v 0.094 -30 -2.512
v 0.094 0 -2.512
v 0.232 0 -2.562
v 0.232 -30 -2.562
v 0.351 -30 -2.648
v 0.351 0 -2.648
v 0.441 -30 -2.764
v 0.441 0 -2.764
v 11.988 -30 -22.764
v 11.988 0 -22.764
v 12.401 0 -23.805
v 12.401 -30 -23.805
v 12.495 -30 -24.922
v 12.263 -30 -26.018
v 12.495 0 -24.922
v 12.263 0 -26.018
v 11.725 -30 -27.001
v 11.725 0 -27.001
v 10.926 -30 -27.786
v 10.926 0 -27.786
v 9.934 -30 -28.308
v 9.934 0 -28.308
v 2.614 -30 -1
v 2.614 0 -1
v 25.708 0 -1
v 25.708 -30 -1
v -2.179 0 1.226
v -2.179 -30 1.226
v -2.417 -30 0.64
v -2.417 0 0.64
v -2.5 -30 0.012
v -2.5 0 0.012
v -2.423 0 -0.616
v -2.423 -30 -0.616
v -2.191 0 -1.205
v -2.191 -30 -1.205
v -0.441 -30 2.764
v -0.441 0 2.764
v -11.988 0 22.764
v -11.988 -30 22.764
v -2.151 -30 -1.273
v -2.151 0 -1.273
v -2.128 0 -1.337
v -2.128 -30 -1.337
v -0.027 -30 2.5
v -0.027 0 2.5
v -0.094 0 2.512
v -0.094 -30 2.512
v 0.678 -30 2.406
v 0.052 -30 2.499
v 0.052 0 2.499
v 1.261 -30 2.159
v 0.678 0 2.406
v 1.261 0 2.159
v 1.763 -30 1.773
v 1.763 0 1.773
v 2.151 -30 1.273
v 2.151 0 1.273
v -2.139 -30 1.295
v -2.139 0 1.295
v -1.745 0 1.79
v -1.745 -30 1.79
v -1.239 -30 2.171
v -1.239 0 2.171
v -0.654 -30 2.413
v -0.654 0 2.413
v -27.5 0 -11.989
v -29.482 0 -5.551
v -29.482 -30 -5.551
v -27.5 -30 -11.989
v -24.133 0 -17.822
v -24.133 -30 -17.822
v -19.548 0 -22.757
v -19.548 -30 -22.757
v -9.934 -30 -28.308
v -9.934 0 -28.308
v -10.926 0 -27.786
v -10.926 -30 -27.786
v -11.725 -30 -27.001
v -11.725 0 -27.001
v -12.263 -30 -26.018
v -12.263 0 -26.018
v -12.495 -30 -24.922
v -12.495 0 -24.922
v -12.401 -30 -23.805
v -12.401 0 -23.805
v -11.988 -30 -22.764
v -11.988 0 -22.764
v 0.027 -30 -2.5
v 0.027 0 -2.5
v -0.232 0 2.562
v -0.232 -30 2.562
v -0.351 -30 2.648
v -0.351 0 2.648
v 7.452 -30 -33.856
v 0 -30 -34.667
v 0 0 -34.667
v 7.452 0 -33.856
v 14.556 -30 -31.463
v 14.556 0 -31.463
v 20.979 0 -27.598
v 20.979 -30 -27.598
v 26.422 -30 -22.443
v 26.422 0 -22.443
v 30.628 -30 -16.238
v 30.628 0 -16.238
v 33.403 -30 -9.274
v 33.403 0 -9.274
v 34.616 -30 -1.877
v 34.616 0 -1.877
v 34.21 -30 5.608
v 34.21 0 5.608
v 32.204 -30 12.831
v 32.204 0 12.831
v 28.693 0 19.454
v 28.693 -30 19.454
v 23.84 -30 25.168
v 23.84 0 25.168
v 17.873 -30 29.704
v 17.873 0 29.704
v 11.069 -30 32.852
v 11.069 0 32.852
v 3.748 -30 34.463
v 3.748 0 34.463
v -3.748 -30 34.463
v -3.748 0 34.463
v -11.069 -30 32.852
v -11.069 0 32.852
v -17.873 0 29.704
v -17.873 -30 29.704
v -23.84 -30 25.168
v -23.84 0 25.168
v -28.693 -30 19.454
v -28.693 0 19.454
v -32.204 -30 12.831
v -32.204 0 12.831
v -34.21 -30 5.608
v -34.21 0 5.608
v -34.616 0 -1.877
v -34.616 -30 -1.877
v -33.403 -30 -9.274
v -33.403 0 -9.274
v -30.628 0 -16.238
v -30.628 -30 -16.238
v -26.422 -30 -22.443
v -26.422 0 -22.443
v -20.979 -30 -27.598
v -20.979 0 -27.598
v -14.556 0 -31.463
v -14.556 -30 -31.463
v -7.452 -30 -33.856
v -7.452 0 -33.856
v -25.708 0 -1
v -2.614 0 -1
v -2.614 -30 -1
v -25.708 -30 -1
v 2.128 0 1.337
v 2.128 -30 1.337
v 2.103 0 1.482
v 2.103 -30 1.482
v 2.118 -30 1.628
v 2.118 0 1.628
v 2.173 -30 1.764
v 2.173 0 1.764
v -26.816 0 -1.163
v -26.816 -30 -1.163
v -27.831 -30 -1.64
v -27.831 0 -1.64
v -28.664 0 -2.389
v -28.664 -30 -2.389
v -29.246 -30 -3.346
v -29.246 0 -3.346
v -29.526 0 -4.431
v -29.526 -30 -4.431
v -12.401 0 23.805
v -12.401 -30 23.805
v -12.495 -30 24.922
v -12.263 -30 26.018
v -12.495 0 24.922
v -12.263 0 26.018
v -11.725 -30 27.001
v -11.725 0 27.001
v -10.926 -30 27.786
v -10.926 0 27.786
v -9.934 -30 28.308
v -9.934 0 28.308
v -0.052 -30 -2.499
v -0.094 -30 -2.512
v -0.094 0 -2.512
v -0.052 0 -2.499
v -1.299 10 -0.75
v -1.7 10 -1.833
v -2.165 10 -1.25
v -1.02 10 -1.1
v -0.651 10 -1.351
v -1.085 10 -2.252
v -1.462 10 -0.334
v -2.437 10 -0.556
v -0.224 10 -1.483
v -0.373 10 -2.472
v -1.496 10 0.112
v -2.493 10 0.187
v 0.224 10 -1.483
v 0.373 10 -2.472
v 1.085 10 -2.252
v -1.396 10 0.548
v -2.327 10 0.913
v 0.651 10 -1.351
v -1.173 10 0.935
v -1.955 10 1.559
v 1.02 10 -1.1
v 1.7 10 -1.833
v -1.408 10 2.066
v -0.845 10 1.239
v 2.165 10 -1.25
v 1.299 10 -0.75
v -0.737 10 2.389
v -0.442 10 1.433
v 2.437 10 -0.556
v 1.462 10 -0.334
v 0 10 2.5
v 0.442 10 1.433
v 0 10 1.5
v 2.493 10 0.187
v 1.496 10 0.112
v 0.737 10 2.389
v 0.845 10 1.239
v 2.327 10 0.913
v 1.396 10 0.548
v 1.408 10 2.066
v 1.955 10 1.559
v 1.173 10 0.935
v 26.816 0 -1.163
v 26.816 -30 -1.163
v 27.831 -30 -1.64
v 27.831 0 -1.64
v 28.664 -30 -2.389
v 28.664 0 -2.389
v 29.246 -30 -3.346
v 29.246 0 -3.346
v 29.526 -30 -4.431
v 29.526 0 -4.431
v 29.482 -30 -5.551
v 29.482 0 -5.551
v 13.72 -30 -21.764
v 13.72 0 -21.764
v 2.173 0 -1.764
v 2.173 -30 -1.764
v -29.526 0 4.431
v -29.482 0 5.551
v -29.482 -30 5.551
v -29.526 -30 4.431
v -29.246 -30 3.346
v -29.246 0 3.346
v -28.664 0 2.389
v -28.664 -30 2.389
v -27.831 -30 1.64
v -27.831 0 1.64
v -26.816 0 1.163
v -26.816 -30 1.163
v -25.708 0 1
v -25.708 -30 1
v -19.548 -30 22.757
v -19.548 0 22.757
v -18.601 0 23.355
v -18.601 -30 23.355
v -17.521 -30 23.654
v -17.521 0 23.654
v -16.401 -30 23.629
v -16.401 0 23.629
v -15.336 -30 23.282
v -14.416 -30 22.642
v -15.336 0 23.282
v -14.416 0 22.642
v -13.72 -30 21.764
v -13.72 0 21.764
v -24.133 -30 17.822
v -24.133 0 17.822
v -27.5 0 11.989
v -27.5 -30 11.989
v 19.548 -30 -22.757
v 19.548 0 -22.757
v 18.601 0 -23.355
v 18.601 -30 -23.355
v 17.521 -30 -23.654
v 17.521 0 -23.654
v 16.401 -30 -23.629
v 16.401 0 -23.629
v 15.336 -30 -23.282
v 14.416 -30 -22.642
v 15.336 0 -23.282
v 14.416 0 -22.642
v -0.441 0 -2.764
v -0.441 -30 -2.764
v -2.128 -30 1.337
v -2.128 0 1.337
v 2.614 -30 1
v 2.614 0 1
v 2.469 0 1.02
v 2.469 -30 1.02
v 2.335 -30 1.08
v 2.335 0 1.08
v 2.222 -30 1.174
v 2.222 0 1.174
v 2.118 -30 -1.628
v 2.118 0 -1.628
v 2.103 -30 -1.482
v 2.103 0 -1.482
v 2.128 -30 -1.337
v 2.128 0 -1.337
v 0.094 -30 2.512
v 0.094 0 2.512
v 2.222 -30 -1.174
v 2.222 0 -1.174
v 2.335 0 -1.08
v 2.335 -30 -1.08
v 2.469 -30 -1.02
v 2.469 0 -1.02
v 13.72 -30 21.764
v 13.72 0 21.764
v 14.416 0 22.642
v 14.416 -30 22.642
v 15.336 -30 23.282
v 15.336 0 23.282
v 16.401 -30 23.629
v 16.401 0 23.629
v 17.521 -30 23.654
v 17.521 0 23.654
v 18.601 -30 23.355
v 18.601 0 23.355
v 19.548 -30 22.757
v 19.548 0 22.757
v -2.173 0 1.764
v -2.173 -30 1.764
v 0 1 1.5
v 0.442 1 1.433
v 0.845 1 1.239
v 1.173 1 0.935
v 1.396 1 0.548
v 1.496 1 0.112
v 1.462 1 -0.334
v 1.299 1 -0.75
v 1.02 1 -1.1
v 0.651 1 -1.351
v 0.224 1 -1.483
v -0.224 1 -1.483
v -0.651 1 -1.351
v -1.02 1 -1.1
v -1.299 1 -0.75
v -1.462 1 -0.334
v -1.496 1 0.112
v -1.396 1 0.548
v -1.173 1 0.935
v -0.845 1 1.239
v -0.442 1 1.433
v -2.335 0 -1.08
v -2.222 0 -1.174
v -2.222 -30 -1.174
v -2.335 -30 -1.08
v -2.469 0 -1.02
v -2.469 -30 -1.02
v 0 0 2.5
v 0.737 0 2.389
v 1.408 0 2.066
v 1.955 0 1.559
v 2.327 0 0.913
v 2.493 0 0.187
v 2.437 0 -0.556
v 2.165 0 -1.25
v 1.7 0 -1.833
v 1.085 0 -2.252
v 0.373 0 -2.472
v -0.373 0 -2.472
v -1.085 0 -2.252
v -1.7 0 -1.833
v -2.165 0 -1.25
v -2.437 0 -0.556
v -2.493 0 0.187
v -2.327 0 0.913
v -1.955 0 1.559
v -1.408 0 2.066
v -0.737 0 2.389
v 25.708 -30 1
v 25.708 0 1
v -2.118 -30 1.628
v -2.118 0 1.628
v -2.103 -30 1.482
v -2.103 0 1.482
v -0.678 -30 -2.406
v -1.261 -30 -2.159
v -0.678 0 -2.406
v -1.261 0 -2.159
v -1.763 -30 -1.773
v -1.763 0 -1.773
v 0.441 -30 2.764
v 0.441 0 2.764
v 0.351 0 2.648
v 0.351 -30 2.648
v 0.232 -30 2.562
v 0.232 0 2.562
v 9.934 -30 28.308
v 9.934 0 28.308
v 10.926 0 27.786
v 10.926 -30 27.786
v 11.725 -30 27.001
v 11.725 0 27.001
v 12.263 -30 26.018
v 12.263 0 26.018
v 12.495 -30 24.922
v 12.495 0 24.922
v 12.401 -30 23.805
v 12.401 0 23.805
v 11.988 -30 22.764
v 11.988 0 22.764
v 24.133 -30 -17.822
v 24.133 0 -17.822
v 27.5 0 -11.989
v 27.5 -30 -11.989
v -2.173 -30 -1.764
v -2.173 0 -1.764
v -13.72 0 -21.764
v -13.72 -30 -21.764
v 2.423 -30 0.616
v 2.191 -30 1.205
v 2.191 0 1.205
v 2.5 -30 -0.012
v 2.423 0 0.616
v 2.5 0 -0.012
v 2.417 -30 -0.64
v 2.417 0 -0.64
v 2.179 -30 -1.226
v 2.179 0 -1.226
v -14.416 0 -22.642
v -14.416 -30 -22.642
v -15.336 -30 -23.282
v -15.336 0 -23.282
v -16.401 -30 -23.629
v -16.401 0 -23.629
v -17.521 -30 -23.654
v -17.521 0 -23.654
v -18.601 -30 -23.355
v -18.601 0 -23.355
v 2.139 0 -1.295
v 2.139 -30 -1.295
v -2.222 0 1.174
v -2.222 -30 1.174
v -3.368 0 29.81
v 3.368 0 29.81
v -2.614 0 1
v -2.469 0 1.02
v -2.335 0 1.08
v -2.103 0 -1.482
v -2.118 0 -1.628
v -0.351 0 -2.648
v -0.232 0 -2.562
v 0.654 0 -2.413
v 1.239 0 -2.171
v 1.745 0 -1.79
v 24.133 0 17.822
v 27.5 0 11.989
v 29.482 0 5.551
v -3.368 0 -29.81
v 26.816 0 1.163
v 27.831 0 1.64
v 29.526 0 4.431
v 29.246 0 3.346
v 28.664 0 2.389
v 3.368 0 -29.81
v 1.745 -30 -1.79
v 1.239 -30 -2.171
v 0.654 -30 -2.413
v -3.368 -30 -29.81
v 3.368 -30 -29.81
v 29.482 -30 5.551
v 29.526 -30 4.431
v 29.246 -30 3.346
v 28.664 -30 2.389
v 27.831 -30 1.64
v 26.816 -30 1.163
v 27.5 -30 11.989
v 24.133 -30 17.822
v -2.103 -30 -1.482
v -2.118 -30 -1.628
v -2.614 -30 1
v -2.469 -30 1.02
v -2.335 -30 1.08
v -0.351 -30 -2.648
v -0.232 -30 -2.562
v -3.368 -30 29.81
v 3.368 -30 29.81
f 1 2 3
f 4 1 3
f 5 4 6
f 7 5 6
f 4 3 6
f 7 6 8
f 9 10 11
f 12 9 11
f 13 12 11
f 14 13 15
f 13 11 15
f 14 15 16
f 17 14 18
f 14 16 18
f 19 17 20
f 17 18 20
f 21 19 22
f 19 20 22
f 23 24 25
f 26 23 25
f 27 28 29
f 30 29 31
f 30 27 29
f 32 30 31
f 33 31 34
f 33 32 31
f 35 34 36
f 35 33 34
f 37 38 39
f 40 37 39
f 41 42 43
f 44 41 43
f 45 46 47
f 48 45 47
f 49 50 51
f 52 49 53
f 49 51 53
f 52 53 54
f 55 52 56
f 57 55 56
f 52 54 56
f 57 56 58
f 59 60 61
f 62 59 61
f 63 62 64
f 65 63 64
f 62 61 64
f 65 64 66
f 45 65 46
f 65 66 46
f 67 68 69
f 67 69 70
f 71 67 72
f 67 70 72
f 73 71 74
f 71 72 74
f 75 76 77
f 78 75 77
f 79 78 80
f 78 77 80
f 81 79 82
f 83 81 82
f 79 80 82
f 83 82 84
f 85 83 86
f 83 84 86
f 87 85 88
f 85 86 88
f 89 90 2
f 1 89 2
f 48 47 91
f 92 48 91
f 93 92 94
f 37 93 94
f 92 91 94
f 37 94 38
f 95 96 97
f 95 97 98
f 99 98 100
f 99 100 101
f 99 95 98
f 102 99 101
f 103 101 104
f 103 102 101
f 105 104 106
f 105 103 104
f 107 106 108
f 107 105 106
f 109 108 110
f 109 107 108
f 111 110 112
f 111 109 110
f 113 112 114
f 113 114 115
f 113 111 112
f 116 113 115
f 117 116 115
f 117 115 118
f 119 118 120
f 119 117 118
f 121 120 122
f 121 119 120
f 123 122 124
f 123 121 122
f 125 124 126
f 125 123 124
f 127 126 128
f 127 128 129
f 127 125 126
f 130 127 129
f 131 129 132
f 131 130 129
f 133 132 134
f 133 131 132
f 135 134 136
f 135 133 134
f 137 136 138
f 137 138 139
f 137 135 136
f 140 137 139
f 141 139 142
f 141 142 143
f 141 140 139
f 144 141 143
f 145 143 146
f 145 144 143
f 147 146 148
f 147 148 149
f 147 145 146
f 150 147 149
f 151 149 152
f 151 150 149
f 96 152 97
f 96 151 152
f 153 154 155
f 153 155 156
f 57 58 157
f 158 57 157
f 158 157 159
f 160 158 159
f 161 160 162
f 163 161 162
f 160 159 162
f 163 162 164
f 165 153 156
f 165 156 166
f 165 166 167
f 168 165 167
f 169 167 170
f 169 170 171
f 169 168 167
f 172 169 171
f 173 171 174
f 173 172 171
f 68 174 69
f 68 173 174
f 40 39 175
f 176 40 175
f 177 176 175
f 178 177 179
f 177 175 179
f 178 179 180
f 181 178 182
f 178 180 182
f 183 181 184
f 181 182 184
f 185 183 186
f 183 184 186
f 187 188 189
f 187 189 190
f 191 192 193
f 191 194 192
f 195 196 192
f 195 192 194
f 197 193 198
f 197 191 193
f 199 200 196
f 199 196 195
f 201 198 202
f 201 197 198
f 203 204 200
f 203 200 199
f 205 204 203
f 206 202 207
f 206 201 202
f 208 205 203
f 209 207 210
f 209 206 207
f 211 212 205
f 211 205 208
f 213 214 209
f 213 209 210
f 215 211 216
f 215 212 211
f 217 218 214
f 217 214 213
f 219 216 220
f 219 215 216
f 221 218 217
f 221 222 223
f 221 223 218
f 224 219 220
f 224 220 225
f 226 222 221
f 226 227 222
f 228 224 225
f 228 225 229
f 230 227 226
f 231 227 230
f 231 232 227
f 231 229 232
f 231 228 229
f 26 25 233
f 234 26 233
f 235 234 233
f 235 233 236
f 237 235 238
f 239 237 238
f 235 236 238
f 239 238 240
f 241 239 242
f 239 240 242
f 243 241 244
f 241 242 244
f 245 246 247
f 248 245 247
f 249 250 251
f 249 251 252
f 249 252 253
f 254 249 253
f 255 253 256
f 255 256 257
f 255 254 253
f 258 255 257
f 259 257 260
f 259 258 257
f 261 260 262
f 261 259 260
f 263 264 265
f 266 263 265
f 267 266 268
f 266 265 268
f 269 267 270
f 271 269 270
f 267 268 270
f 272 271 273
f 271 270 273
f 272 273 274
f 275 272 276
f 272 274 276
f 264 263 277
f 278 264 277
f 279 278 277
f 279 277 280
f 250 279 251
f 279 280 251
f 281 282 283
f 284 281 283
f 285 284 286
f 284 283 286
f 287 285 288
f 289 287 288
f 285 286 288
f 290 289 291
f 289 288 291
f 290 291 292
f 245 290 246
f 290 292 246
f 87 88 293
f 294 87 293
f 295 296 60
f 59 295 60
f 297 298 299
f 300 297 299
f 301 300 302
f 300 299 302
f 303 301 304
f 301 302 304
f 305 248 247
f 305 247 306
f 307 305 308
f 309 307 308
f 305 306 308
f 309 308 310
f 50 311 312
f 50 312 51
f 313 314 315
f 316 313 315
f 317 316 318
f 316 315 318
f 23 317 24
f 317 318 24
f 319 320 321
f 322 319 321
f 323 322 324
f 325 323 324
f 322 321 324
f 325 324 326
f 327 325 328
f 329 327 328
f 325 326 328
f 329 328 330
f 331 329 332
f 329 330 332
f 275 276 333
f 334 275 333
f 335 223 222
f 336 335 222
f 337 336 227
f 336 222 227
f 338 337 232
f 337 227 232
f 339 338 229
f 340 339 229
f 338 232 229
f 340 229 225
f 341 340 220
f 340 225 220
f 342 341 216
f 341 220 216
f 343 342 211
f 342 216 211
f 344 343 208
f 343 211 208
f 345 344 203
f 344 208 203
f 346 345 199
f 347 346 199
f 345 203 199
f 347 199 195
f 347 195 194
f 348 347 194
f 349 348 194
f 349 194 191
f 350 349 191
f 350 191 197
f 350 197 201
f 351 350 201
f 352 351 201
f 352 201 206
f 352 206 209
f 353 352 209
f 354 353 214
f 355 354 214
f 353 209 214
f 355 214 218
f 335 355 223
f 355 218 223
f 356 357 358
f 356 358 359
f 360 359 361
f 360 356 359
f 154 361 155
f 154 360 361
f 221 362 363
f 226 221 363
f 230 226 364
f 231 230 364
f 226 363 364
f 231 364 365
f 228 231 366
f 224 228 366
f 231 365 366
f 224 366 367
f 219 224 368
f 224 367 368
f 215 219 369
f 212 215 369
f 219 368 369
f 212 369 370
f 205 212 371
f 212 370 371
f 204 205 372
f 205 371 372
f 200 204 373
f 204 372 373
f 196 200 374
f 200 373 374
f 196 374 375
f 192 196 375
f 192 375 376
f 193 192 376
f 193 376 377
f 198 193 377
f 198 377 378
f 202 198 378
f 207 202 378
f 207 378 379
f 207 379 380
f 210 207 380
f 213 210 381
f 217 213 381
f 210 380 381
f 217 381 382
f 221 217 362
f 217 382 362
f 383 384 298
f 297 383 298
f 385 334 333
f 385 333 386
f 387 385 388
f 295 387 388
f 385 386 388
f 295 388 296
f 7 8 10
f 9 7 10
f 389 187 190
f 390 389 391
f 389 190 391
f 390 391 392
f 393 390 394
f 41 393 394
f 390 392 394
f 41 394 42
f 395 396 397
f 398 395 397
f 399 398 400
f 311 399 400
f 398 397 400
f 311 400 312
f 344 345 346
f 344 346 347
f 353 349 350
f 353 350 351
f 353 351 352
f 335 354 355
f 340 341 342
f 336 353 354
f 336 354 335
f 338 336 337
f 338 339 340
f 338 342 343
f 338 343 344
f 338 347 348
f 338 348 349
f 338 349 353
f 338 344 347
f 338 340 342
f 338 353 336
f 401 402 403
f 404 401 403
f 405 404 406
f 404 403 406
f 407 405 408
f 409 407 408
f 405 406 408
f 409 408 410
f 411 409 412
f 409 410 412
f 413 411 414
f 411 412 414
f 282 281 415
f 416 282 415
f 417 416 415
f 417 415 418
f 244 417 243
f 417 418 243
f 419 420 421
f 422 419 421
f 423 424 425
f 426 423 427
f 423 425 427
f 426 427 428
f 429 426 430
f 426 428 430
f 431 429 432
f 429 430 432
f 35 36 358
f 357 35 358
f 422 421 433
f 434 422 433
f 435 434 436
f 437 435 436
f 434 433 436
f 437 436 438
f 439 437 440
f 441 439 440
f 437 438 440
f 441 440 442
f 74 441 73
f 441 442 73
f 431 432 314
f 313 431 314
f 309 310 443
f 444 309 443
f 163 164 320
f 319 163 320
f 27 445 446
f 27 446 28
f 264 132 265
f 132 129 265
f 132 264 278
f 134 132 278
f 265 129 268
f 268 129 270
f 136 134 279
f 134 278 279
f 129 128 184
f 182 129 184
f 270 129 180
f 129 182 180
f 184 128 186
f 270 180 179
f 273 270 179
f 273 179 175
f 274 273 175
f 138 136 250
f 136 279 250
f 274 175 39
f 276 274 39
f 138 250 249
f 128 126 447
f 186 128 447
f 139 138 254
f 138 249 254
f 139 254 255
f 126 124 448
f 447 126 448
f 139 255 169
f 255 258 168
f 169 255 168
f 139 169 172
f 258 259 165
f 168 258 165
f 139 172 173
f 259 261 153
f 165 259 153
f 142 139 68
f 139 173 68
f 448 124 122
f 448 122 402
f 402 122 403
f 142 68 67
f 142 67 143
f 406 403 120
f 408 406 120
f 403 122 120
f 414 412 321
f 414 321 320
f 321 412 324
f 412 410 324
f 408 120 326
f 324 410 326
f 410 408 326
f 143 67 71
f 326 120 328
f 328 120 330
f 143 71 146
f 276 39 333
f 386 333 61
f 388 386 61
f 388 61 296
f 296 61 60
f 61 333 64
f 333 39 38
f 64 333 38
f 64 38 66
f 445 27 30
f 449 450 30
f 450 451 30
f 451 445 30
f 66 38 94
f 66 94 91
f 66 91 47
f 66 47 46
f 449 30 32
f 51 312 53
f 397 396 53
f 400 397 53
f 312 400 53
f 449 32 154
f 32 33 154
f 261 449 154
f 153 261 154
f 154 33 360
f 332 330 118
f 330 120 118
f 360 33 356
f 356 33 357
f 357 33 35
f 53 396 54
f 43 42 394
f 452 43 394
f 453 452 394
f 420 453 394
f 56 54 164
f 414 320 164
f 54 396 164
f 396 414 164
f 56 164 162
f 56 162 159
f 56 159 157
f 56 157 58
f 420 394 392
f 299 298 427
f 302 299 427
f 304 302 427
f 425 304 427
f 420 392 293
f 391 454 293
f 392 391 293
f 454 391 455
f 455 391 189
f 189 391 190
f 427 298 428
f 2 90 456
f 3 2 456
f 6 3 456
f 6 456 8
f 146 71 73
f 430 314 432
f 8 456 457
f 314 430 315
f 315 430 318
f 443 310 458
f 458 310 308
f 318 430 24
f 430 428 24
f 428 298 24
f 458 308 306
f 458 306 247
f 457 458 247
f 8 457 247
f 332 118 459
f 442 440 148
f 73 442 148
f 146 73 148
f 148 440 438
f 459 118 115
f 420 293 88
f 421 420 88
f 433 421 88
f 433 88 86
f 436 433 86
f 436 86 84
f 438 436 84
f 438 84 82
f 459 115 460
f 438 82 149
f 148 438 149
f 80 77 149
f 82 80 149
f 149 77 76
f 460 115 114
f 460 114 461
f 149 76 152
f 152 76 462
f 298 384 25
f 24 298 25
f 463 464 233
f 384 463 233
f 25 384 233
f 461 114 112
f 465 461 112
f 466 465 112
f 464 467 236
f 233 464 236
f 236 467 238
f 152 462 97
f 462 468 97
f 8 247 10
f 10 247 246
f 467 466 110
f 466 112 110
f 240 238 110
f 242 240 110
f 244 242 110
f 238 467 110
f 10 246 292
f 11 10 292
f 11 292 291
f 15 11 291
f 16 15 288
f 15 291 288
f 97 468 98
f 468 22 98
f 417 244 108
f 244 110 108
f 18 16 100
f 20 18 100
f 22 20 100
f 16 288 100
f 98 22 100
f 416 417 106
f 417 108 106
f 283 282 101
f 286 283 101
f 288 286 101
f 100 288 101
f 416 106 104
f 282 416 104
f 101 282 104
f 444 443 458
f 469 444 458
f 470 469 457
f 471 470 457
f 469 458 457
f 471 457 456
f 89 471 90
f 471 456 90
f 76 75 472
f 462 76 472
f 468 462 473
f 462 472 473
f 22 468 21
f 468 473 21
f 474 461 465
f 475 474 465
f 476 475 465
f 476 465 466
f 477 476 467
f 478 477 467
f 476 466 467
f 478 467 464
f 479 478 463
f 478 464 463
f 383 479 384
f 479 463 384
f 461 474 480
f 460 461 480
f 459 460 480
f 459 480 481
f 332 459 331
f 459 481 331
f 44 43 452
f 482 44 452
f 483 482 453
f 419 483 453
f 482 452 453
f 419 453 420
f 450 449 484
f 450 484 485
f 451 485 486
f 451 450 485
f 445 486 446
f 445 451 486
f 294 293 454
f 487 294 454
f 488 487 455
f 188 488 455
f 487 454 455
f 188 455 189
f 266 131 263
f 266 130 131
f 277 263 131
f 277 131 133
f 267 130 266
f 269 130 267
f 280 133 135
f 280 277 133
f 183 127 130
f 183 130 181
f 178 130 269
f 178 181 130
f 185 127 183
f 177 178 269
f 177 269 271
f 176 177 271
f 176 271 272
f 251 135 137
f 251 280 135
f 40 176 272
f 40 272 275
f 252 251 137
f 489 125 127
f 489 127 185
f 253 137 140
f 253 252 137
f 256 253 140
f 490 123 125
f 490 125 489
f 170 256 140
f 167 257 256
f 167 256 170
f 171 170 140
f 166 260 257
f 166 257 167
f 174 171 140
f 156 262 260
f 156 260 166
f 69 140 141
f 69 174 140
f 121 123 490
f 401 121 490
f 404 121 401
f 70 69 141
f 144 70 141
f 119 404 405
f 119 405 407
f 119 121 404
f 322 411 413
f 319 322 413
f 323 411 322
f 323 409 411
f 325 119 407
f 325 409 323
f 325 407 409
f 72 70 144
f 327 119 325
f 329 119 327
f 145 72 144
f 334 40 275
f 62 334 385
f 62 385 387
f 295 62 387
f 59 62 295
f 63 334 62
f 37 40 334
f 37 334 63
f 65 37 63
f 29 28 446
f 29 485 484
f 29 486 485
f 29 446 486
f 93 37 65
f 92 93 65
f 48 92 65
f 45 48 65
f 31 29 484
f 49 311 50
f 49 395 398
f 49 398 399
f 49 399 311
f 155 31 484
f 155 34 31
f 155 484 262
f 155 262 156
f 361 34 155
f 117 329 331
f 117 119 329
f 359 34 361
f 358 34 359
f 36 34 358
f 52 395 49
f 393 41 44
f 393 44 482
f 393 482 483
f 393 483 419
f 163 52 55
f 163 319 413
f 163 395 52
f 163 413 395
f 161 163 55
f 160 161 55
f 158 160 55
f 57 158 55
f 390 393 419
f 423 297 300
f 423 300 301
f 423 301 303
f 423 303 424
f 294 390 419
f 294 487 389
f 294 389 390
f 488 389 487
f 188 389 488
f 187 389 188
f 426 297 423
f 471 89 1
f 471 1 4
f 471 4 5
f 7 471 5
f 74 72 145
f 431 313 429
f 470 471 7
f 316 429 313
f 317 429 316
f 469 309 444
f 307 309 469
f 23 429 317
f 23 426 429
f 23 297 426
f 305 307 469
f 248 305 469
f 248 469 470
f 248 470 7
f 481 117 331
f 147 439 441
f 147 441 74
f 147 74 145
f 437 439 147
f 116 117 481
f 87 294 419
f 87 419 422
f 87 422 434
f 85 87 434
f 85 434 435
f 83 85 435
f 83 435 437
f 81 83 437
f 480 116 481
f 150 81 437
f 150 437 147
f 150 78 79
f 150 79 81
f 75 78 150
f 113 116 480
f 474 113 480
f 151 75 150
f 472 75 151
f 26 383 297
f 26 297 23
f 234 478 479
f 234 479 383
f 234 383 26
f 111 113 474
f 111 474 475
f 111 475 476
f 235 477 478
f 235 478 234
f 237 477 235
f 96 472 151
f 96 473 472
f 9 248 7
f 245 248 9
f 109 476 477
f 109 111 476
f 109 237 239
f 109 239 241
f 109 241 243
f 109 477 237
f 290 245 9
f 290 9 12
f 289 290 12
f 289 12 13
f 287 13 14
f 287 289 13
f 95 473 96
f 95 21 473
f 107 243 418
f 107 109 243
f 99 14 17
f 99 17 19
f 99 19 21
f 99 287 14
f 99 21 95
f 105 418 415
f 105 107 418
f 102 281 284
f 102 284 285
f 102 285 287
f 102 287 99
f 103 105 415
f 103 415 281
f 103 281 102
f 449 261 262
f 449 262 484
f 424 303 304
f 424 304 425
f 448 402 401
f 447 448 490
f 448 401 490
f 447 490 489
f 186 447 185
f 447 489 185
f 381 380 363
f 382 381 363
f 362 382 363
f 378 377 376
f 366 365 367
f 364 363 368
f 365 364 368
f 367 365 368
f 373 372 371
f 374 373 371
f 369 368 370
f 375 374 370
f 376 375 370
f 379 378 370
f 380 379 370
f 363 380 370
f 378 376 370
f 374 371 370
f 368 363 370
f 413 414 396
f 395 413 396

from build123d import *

# Parameters (mm, degrees)
SKETCH1_R             = 2.5
SKETCH1_R_2           = 1.5
BOSS_EXTRUDE1_DEPTH   = 10
BOSS_EXTRUDE3_DEPTH   = 30
BOSS_EXTRUDE3_2_DEPTH = 30
BOSS_EXTRUDE3_3_DEPTH = 30
BOSS_EXTRUDE3_4_DEPTH = 30
BOSS_EXTRUDE3_5_DEPTH = 30
BOSS_EXTRUDE3_6_DEPTH = 30
SKETCH5_R             = 34.666608733
SKETCH5_R_2           = 30
BOSS_EXTRUDE4_DEPTH   = 30
BOSS_EXTRUDE5_START   = -10
SKETCH6_R             = 1.5
BOSS_EXTRUDE5_DEPTH   = 10
SKETCH7_R             = 1.5
CUT_EXTRUDE1_DEPTH    = 9


with BuildPart() as part:
    # Sketch1 → Boss-Extrude1 (new body)
    with BuildSketch(Plane(origin=(0, 0, 0), x_dir=(1, 0, 0), z_dir=(0, 1, 0))):
        with Locations(Location((0, 0, 0), (0, 0, 270))):
            Circle(SKETCH1_R)
        with Locations(Location((0, 0, 0), (0, 0, 270))):
            Circle(SKETCH1_R_2, mode=Mode.SUBTRACT)
    extrude(amount=BOSS_EXTRUDE1_DEPTH)

    # Sketch6 → Boss-Extrude5 (add)
    with BuildSketch(Plane(origin=(0, 10, 0), x_dir=(1, 0, 0), z_dir=(0, 1, 0)).offset(BOSS_EXTRUDE5_START)):
        Circle(SKETCH6_R)
    extrude(amount=BOSS_EXTRUDE5_DEPTH)

    # Sketch7 → Cut-Extrude1 (cut)
    with BuildSketch(Plane(origin=(0, 10, 0), x_dir=(1, 0, 0), z_dir=(0, 1, 0))):
        with Locations(Location((0, 0, 0), (0, 0, 270))):
            Circle(SKETCH7_R)
    extrude(amount=-CUT_EXTRUDE1_DEPTH, mode=Mode.SUBTRACT)


with BuildPart() as body_2:
    # Sketch2 → Boss-Extrude3 (new body)
    with BuildSketch(Plane(origin=(0, 0, 0), x_dir=(-1, 0, 0), z_dir=(0, -1, 0))):
        with BuildLine():
            Line((2.61395079, 1), (25.707973339, 1))
            ThreePointArc((25.707973339, 1), (28.664062792, 2.388870469), (29.481986287, 5.550899437))
            ThreePointArc((29.481986287, 5.550899437), (30, 0), (29.481986287, -5.550899437))
            ThreePointArc((29.481986287, -5.550899437), (28.664062792, -2.388870469), (25.707973339, -1))
            Line((25.707973339, -1), (2.61395079, -1))
            ThreePointArc((2.61395079, -1), (2.399550586, -1.045528996), (2.222154945, -1.174257873))
            Line((2.222154945, -1.174257873), (2.178514499, -1.226407182))
            ThreePointArc((2.178514499, -1.226407182), (2.499969191, -0.012411485), (2.190584188, 1.204716114))
            Line((2.190584188, 1.204716114), (2.222154945, 1.174257873))
            ThreePointArc((2.222154945, 1.174257873), (2.399550586, 1.045528996), (2.61395079, 1))
        make_face()
    extrude(amount=BOSS_EXTRUDE3_DEPTH)



with BuildPart() as body_3:
    # Sketch2 → Boss-Extrude3 2 (new body)
    with BuildSketch(Plane(origin=(0, 0, 0), x_dir=(-1, 0, 0), z_dir=(0, -1, 0))):
        with BuildLine():
            Line((0.440949991, -2.763747789), (11.987961266, -22.763757991))
            ThreePointArc((11.987961266, -22.763757991), (12.263208883, -26.018241788), (9.933773217, -28.307598797))
            ThreePointArc((9.933773217, -28.307598797), (15, -25.980762114), (19.54821307, -22.75669936))
            ThreePointArc((19.54821307, -22.75669936), (16.400853909, -23.629371319), (13.720012073, -21.763757991))
            Line((13.720012073, -21.763757991), (2.173000799, -1.763747789))
            ThreePointArc((2.173000799, -1.763747789), (2.105229964, -1.555307267), (2.128014621, -1.337313697))
            Line((2.128014621, -1.337313697), (2.138606853, -1.294743499))
            ThreePointArc((2.138606853, -1.294743499), (1.239235934, -2.17124257), (0.027157474, -2.49985249))
            Line((0.027157474, -2.49985249), (0.094140324, -2.511571571))
            ThreePointArc((0.094140324, -2.511571571), (0.294320622, -2.600836263), (0.440949991, -2.763747789))
        make_face()
    extrude(amount=BOSS_EXTRUDE3_2_DEPTH)


with BuildPart() as body_4:
    # Sketch2 → Boss-Extrude3 3 (new body)
    with BuildSketch(Plane(origin=(0, 0, 0), x_dir=(-1, 0, 0), z_dir=(0, -1, 0))):
        with BuildLine():
            Line((-2.173000799, -1.763747789), (-13.720012073, -21.763757991))
            ThreePointArc((-13.720012073, -21.763757991), (-16.400853909, -23.629371319), (-19.54821307, -22.75669936))
            ThreePointArc((-19.54821307, -22.75669936), (-15, -25.980762114), (-9.933773217, -28.307598797))
            ThreePointArc((-9.933773217, -28.307598797), (-12.263208883, -26.018241788), (-11.987961266, -22.763757991))
            Line((-11.987961266, -22.763757991), (-0.440949991, -2.763747789))
            ThreePointArc((-0.440949991, -2.763747789), (-0.294320622, -2.600836263), (-0.094140324, -2.511571571))
            Line((-0.094140324, -2.511571571), (-0.051977335, -2.499459613))
            ThreePointArc((-0.051977335, -2.499459613), (-1.260733257, -2.158831086), (-2.151357025, -1.273445308))
            Line((-2.151357025, -1.273445308), (-2.128014621, -1.337313697))
            ThreePointArc((-2.128014621, -1.337313697), (-2.105229964, -1.555307267), (-2.173000799, -1.763747789))
        make_face()
    extrude(amount=BOSS_EXTRUDE3_3_DEPTH)


with BuildPart() as body_5:
    # Sketch2 → Boss-Extrude3 4 (new body)
    with BuildSketch(Plane(origin=(0, 0, 0), x_dir=(-1, 0, 0), z_dir=(0, -1, 0))):
        with BuildLine():
            Line((-2.61395079, 1), (-25.707973339, 1))
            ThreePointArc((-25.707973339, 1), (-28.664062792, 2.388870469), (-29.481986287, 5.550899437))
            ThreePointArc((-29.481986287, 5.550899437), (-30, 0), (-29.481986287, -5.550899437))
            ThreePointArc((-29.481986287, -5.550899437), (-28.664062792, -2.388870469), (-25.707973339, -1))
            Line((-25.707973339, -1), (-2.61395079, -1))
            ThreePointArc((-2.61395079, -1), (-2.399550586, -1.045528996), (-2.222154945, -1.174257873))
            Line((-2.222154945, -1.174257873), (-2.190584188, -1.204716114))
            ThreePointArc((-2.190584188, -1.204716114), (-2.499969191, 0.012411485), (-2.178514499, 1.226407182))
            Line((-2.178514499, 1.226407182), (-2.222154945, 1.174257873))
            ThreePointArc((-2.222154945, 1.174257873), (-2.399550586, 1.045528996), (-2.61395079, 1))
        make_face()
    extrude(amount=BOSS_EXTRUDE3_4_DEPTH)


with BuildPart() as body_6:
    # Sketch2 → Boss-Extrude3 5 (new body)
    with BuildSketch(Plane(origin=(0, 0, 0), x_dir=(-1, 0, 0), z_dir=(0, -1, 0))):
        with BuildLine():
            Line((-0.440949991, 2.763747789), (-11.987961266, 22.763757991))
            ThreePointArc((-11.987961266, 22.763757991), (-12.263208883, 26.018241788), (-9.933773217, 28.307598797))
            ThreePointArc((-9.933773217, 28.307598797), (-15, 25.980762114), (-19.54821307, 22.75669936))
            ThreePointArc((-19.54821307, 22.75669936), (-16.400853909, 23.629371319), (-13.720012073, 21.763757991))
            Line((-13.720012073, 21.763757991), (-2.173000799, 1.763747789))
            ThreePointArc((-2.173000799, 1.763747789), (-2.105229964, 1.555307267), (-2.128014621, 1.337313697))
            Line((-2.128014621, 1.337313697), (-2.138606853, 1.294743499))
            ThreePointArc((-2.138606853, 1.294743499), (-1.239235934, 2.17124257), (-0.027157474, 2.49985249))
            Line((-0.027157474, 2.49985249), (-0.094140324, 2.511571571))
            ThreePointArc((-0.094140324, 2.511571571), (-0.294320622, 2.600836263), (-0.440949991, 2.763747789))
        make_face()
    extrude(amount=BOSS_EXTRUDE3_5_DEPTH)


with BuildPart() as body_7:
    # Sketch2 → Boss-Extrude3 6 (new body)
    with BuildSketch(Plane(origin=(0, 0, 0), x_dir=(-1, 0, 0), z_dir=(0, -1, 0))):
        with BuildLine():
            Line((2.173000799, 1.763747789), (13.720012073, 21.763757991))
            ThreePointArc((13.720012073, 21.763757991), (16.400853909, 23.629371319), (19.54821307, 22.75669936))
            ThreePointArc((19.54821307, 22.75669936), (15, 25.980762114), (9.933773217, 28.307598797))
            ThreePointArc((9.933773217, 28.307598797), (12.263208883, 26.018241788), (11.987961266, 22.763757991))
            Line((11.987961266, 22.763757991), (0.440949991, 2.763747789))
            ThreePointArc((0.440949991, 2.763747789), (0.294320622, 2.600836263), (0.094140324, 2.511571571))
            Line((0.094140324, 2.511571571), (0.051977335, 2.499459613))
            ThreePointArc((0.051977335, 2.499459613), (1.260733257, 2.158831086), (2.151357025, 1.273445308))
            Line((2.151357025, 1.273445308), (2.128014621, 1.337313697))
            ThreePointArc((2.128014621, 1.337313697), (2.105229964, 1.555307267), (2.173000799, 1.763747789))
        make_face()
    extrude(amount=BOSS_EXTRUDE3_6_DEPTH)


with BuildPart() as body_2_1:
    add(body_2.part)

    add(body_3.part)  # Boss-Extrude4 merges body 3

    add(body_4.part)  # Boss-Extrude4 merges body 4

    add(body_5.part)  # Boss-Extrude4 merges body 5

    add(body_6.part)  # Boss-Extrude4 merges body 6

    add(body_7.part)  # Boss-Extrude4 merges body 7
    # Sketch5 → Boss-Extrude4 (add)
    with BuildSketch(Plane(origin=(0, -30, 0), x_dir=(-1, 0, 0), z_dir=(0, -1, 0))):
        with Locations(Location((0, 0, 0), (0, 0, 90))):
            Circle(SKETCH5_R)
        Circle(SKETCH5_R_2, mode=Mode.SUBTRACT)
    extrude(amount=-BOSS_EXTRUDE4_DEPTH)


solid = Compound([part.part, body_2_1.part])
